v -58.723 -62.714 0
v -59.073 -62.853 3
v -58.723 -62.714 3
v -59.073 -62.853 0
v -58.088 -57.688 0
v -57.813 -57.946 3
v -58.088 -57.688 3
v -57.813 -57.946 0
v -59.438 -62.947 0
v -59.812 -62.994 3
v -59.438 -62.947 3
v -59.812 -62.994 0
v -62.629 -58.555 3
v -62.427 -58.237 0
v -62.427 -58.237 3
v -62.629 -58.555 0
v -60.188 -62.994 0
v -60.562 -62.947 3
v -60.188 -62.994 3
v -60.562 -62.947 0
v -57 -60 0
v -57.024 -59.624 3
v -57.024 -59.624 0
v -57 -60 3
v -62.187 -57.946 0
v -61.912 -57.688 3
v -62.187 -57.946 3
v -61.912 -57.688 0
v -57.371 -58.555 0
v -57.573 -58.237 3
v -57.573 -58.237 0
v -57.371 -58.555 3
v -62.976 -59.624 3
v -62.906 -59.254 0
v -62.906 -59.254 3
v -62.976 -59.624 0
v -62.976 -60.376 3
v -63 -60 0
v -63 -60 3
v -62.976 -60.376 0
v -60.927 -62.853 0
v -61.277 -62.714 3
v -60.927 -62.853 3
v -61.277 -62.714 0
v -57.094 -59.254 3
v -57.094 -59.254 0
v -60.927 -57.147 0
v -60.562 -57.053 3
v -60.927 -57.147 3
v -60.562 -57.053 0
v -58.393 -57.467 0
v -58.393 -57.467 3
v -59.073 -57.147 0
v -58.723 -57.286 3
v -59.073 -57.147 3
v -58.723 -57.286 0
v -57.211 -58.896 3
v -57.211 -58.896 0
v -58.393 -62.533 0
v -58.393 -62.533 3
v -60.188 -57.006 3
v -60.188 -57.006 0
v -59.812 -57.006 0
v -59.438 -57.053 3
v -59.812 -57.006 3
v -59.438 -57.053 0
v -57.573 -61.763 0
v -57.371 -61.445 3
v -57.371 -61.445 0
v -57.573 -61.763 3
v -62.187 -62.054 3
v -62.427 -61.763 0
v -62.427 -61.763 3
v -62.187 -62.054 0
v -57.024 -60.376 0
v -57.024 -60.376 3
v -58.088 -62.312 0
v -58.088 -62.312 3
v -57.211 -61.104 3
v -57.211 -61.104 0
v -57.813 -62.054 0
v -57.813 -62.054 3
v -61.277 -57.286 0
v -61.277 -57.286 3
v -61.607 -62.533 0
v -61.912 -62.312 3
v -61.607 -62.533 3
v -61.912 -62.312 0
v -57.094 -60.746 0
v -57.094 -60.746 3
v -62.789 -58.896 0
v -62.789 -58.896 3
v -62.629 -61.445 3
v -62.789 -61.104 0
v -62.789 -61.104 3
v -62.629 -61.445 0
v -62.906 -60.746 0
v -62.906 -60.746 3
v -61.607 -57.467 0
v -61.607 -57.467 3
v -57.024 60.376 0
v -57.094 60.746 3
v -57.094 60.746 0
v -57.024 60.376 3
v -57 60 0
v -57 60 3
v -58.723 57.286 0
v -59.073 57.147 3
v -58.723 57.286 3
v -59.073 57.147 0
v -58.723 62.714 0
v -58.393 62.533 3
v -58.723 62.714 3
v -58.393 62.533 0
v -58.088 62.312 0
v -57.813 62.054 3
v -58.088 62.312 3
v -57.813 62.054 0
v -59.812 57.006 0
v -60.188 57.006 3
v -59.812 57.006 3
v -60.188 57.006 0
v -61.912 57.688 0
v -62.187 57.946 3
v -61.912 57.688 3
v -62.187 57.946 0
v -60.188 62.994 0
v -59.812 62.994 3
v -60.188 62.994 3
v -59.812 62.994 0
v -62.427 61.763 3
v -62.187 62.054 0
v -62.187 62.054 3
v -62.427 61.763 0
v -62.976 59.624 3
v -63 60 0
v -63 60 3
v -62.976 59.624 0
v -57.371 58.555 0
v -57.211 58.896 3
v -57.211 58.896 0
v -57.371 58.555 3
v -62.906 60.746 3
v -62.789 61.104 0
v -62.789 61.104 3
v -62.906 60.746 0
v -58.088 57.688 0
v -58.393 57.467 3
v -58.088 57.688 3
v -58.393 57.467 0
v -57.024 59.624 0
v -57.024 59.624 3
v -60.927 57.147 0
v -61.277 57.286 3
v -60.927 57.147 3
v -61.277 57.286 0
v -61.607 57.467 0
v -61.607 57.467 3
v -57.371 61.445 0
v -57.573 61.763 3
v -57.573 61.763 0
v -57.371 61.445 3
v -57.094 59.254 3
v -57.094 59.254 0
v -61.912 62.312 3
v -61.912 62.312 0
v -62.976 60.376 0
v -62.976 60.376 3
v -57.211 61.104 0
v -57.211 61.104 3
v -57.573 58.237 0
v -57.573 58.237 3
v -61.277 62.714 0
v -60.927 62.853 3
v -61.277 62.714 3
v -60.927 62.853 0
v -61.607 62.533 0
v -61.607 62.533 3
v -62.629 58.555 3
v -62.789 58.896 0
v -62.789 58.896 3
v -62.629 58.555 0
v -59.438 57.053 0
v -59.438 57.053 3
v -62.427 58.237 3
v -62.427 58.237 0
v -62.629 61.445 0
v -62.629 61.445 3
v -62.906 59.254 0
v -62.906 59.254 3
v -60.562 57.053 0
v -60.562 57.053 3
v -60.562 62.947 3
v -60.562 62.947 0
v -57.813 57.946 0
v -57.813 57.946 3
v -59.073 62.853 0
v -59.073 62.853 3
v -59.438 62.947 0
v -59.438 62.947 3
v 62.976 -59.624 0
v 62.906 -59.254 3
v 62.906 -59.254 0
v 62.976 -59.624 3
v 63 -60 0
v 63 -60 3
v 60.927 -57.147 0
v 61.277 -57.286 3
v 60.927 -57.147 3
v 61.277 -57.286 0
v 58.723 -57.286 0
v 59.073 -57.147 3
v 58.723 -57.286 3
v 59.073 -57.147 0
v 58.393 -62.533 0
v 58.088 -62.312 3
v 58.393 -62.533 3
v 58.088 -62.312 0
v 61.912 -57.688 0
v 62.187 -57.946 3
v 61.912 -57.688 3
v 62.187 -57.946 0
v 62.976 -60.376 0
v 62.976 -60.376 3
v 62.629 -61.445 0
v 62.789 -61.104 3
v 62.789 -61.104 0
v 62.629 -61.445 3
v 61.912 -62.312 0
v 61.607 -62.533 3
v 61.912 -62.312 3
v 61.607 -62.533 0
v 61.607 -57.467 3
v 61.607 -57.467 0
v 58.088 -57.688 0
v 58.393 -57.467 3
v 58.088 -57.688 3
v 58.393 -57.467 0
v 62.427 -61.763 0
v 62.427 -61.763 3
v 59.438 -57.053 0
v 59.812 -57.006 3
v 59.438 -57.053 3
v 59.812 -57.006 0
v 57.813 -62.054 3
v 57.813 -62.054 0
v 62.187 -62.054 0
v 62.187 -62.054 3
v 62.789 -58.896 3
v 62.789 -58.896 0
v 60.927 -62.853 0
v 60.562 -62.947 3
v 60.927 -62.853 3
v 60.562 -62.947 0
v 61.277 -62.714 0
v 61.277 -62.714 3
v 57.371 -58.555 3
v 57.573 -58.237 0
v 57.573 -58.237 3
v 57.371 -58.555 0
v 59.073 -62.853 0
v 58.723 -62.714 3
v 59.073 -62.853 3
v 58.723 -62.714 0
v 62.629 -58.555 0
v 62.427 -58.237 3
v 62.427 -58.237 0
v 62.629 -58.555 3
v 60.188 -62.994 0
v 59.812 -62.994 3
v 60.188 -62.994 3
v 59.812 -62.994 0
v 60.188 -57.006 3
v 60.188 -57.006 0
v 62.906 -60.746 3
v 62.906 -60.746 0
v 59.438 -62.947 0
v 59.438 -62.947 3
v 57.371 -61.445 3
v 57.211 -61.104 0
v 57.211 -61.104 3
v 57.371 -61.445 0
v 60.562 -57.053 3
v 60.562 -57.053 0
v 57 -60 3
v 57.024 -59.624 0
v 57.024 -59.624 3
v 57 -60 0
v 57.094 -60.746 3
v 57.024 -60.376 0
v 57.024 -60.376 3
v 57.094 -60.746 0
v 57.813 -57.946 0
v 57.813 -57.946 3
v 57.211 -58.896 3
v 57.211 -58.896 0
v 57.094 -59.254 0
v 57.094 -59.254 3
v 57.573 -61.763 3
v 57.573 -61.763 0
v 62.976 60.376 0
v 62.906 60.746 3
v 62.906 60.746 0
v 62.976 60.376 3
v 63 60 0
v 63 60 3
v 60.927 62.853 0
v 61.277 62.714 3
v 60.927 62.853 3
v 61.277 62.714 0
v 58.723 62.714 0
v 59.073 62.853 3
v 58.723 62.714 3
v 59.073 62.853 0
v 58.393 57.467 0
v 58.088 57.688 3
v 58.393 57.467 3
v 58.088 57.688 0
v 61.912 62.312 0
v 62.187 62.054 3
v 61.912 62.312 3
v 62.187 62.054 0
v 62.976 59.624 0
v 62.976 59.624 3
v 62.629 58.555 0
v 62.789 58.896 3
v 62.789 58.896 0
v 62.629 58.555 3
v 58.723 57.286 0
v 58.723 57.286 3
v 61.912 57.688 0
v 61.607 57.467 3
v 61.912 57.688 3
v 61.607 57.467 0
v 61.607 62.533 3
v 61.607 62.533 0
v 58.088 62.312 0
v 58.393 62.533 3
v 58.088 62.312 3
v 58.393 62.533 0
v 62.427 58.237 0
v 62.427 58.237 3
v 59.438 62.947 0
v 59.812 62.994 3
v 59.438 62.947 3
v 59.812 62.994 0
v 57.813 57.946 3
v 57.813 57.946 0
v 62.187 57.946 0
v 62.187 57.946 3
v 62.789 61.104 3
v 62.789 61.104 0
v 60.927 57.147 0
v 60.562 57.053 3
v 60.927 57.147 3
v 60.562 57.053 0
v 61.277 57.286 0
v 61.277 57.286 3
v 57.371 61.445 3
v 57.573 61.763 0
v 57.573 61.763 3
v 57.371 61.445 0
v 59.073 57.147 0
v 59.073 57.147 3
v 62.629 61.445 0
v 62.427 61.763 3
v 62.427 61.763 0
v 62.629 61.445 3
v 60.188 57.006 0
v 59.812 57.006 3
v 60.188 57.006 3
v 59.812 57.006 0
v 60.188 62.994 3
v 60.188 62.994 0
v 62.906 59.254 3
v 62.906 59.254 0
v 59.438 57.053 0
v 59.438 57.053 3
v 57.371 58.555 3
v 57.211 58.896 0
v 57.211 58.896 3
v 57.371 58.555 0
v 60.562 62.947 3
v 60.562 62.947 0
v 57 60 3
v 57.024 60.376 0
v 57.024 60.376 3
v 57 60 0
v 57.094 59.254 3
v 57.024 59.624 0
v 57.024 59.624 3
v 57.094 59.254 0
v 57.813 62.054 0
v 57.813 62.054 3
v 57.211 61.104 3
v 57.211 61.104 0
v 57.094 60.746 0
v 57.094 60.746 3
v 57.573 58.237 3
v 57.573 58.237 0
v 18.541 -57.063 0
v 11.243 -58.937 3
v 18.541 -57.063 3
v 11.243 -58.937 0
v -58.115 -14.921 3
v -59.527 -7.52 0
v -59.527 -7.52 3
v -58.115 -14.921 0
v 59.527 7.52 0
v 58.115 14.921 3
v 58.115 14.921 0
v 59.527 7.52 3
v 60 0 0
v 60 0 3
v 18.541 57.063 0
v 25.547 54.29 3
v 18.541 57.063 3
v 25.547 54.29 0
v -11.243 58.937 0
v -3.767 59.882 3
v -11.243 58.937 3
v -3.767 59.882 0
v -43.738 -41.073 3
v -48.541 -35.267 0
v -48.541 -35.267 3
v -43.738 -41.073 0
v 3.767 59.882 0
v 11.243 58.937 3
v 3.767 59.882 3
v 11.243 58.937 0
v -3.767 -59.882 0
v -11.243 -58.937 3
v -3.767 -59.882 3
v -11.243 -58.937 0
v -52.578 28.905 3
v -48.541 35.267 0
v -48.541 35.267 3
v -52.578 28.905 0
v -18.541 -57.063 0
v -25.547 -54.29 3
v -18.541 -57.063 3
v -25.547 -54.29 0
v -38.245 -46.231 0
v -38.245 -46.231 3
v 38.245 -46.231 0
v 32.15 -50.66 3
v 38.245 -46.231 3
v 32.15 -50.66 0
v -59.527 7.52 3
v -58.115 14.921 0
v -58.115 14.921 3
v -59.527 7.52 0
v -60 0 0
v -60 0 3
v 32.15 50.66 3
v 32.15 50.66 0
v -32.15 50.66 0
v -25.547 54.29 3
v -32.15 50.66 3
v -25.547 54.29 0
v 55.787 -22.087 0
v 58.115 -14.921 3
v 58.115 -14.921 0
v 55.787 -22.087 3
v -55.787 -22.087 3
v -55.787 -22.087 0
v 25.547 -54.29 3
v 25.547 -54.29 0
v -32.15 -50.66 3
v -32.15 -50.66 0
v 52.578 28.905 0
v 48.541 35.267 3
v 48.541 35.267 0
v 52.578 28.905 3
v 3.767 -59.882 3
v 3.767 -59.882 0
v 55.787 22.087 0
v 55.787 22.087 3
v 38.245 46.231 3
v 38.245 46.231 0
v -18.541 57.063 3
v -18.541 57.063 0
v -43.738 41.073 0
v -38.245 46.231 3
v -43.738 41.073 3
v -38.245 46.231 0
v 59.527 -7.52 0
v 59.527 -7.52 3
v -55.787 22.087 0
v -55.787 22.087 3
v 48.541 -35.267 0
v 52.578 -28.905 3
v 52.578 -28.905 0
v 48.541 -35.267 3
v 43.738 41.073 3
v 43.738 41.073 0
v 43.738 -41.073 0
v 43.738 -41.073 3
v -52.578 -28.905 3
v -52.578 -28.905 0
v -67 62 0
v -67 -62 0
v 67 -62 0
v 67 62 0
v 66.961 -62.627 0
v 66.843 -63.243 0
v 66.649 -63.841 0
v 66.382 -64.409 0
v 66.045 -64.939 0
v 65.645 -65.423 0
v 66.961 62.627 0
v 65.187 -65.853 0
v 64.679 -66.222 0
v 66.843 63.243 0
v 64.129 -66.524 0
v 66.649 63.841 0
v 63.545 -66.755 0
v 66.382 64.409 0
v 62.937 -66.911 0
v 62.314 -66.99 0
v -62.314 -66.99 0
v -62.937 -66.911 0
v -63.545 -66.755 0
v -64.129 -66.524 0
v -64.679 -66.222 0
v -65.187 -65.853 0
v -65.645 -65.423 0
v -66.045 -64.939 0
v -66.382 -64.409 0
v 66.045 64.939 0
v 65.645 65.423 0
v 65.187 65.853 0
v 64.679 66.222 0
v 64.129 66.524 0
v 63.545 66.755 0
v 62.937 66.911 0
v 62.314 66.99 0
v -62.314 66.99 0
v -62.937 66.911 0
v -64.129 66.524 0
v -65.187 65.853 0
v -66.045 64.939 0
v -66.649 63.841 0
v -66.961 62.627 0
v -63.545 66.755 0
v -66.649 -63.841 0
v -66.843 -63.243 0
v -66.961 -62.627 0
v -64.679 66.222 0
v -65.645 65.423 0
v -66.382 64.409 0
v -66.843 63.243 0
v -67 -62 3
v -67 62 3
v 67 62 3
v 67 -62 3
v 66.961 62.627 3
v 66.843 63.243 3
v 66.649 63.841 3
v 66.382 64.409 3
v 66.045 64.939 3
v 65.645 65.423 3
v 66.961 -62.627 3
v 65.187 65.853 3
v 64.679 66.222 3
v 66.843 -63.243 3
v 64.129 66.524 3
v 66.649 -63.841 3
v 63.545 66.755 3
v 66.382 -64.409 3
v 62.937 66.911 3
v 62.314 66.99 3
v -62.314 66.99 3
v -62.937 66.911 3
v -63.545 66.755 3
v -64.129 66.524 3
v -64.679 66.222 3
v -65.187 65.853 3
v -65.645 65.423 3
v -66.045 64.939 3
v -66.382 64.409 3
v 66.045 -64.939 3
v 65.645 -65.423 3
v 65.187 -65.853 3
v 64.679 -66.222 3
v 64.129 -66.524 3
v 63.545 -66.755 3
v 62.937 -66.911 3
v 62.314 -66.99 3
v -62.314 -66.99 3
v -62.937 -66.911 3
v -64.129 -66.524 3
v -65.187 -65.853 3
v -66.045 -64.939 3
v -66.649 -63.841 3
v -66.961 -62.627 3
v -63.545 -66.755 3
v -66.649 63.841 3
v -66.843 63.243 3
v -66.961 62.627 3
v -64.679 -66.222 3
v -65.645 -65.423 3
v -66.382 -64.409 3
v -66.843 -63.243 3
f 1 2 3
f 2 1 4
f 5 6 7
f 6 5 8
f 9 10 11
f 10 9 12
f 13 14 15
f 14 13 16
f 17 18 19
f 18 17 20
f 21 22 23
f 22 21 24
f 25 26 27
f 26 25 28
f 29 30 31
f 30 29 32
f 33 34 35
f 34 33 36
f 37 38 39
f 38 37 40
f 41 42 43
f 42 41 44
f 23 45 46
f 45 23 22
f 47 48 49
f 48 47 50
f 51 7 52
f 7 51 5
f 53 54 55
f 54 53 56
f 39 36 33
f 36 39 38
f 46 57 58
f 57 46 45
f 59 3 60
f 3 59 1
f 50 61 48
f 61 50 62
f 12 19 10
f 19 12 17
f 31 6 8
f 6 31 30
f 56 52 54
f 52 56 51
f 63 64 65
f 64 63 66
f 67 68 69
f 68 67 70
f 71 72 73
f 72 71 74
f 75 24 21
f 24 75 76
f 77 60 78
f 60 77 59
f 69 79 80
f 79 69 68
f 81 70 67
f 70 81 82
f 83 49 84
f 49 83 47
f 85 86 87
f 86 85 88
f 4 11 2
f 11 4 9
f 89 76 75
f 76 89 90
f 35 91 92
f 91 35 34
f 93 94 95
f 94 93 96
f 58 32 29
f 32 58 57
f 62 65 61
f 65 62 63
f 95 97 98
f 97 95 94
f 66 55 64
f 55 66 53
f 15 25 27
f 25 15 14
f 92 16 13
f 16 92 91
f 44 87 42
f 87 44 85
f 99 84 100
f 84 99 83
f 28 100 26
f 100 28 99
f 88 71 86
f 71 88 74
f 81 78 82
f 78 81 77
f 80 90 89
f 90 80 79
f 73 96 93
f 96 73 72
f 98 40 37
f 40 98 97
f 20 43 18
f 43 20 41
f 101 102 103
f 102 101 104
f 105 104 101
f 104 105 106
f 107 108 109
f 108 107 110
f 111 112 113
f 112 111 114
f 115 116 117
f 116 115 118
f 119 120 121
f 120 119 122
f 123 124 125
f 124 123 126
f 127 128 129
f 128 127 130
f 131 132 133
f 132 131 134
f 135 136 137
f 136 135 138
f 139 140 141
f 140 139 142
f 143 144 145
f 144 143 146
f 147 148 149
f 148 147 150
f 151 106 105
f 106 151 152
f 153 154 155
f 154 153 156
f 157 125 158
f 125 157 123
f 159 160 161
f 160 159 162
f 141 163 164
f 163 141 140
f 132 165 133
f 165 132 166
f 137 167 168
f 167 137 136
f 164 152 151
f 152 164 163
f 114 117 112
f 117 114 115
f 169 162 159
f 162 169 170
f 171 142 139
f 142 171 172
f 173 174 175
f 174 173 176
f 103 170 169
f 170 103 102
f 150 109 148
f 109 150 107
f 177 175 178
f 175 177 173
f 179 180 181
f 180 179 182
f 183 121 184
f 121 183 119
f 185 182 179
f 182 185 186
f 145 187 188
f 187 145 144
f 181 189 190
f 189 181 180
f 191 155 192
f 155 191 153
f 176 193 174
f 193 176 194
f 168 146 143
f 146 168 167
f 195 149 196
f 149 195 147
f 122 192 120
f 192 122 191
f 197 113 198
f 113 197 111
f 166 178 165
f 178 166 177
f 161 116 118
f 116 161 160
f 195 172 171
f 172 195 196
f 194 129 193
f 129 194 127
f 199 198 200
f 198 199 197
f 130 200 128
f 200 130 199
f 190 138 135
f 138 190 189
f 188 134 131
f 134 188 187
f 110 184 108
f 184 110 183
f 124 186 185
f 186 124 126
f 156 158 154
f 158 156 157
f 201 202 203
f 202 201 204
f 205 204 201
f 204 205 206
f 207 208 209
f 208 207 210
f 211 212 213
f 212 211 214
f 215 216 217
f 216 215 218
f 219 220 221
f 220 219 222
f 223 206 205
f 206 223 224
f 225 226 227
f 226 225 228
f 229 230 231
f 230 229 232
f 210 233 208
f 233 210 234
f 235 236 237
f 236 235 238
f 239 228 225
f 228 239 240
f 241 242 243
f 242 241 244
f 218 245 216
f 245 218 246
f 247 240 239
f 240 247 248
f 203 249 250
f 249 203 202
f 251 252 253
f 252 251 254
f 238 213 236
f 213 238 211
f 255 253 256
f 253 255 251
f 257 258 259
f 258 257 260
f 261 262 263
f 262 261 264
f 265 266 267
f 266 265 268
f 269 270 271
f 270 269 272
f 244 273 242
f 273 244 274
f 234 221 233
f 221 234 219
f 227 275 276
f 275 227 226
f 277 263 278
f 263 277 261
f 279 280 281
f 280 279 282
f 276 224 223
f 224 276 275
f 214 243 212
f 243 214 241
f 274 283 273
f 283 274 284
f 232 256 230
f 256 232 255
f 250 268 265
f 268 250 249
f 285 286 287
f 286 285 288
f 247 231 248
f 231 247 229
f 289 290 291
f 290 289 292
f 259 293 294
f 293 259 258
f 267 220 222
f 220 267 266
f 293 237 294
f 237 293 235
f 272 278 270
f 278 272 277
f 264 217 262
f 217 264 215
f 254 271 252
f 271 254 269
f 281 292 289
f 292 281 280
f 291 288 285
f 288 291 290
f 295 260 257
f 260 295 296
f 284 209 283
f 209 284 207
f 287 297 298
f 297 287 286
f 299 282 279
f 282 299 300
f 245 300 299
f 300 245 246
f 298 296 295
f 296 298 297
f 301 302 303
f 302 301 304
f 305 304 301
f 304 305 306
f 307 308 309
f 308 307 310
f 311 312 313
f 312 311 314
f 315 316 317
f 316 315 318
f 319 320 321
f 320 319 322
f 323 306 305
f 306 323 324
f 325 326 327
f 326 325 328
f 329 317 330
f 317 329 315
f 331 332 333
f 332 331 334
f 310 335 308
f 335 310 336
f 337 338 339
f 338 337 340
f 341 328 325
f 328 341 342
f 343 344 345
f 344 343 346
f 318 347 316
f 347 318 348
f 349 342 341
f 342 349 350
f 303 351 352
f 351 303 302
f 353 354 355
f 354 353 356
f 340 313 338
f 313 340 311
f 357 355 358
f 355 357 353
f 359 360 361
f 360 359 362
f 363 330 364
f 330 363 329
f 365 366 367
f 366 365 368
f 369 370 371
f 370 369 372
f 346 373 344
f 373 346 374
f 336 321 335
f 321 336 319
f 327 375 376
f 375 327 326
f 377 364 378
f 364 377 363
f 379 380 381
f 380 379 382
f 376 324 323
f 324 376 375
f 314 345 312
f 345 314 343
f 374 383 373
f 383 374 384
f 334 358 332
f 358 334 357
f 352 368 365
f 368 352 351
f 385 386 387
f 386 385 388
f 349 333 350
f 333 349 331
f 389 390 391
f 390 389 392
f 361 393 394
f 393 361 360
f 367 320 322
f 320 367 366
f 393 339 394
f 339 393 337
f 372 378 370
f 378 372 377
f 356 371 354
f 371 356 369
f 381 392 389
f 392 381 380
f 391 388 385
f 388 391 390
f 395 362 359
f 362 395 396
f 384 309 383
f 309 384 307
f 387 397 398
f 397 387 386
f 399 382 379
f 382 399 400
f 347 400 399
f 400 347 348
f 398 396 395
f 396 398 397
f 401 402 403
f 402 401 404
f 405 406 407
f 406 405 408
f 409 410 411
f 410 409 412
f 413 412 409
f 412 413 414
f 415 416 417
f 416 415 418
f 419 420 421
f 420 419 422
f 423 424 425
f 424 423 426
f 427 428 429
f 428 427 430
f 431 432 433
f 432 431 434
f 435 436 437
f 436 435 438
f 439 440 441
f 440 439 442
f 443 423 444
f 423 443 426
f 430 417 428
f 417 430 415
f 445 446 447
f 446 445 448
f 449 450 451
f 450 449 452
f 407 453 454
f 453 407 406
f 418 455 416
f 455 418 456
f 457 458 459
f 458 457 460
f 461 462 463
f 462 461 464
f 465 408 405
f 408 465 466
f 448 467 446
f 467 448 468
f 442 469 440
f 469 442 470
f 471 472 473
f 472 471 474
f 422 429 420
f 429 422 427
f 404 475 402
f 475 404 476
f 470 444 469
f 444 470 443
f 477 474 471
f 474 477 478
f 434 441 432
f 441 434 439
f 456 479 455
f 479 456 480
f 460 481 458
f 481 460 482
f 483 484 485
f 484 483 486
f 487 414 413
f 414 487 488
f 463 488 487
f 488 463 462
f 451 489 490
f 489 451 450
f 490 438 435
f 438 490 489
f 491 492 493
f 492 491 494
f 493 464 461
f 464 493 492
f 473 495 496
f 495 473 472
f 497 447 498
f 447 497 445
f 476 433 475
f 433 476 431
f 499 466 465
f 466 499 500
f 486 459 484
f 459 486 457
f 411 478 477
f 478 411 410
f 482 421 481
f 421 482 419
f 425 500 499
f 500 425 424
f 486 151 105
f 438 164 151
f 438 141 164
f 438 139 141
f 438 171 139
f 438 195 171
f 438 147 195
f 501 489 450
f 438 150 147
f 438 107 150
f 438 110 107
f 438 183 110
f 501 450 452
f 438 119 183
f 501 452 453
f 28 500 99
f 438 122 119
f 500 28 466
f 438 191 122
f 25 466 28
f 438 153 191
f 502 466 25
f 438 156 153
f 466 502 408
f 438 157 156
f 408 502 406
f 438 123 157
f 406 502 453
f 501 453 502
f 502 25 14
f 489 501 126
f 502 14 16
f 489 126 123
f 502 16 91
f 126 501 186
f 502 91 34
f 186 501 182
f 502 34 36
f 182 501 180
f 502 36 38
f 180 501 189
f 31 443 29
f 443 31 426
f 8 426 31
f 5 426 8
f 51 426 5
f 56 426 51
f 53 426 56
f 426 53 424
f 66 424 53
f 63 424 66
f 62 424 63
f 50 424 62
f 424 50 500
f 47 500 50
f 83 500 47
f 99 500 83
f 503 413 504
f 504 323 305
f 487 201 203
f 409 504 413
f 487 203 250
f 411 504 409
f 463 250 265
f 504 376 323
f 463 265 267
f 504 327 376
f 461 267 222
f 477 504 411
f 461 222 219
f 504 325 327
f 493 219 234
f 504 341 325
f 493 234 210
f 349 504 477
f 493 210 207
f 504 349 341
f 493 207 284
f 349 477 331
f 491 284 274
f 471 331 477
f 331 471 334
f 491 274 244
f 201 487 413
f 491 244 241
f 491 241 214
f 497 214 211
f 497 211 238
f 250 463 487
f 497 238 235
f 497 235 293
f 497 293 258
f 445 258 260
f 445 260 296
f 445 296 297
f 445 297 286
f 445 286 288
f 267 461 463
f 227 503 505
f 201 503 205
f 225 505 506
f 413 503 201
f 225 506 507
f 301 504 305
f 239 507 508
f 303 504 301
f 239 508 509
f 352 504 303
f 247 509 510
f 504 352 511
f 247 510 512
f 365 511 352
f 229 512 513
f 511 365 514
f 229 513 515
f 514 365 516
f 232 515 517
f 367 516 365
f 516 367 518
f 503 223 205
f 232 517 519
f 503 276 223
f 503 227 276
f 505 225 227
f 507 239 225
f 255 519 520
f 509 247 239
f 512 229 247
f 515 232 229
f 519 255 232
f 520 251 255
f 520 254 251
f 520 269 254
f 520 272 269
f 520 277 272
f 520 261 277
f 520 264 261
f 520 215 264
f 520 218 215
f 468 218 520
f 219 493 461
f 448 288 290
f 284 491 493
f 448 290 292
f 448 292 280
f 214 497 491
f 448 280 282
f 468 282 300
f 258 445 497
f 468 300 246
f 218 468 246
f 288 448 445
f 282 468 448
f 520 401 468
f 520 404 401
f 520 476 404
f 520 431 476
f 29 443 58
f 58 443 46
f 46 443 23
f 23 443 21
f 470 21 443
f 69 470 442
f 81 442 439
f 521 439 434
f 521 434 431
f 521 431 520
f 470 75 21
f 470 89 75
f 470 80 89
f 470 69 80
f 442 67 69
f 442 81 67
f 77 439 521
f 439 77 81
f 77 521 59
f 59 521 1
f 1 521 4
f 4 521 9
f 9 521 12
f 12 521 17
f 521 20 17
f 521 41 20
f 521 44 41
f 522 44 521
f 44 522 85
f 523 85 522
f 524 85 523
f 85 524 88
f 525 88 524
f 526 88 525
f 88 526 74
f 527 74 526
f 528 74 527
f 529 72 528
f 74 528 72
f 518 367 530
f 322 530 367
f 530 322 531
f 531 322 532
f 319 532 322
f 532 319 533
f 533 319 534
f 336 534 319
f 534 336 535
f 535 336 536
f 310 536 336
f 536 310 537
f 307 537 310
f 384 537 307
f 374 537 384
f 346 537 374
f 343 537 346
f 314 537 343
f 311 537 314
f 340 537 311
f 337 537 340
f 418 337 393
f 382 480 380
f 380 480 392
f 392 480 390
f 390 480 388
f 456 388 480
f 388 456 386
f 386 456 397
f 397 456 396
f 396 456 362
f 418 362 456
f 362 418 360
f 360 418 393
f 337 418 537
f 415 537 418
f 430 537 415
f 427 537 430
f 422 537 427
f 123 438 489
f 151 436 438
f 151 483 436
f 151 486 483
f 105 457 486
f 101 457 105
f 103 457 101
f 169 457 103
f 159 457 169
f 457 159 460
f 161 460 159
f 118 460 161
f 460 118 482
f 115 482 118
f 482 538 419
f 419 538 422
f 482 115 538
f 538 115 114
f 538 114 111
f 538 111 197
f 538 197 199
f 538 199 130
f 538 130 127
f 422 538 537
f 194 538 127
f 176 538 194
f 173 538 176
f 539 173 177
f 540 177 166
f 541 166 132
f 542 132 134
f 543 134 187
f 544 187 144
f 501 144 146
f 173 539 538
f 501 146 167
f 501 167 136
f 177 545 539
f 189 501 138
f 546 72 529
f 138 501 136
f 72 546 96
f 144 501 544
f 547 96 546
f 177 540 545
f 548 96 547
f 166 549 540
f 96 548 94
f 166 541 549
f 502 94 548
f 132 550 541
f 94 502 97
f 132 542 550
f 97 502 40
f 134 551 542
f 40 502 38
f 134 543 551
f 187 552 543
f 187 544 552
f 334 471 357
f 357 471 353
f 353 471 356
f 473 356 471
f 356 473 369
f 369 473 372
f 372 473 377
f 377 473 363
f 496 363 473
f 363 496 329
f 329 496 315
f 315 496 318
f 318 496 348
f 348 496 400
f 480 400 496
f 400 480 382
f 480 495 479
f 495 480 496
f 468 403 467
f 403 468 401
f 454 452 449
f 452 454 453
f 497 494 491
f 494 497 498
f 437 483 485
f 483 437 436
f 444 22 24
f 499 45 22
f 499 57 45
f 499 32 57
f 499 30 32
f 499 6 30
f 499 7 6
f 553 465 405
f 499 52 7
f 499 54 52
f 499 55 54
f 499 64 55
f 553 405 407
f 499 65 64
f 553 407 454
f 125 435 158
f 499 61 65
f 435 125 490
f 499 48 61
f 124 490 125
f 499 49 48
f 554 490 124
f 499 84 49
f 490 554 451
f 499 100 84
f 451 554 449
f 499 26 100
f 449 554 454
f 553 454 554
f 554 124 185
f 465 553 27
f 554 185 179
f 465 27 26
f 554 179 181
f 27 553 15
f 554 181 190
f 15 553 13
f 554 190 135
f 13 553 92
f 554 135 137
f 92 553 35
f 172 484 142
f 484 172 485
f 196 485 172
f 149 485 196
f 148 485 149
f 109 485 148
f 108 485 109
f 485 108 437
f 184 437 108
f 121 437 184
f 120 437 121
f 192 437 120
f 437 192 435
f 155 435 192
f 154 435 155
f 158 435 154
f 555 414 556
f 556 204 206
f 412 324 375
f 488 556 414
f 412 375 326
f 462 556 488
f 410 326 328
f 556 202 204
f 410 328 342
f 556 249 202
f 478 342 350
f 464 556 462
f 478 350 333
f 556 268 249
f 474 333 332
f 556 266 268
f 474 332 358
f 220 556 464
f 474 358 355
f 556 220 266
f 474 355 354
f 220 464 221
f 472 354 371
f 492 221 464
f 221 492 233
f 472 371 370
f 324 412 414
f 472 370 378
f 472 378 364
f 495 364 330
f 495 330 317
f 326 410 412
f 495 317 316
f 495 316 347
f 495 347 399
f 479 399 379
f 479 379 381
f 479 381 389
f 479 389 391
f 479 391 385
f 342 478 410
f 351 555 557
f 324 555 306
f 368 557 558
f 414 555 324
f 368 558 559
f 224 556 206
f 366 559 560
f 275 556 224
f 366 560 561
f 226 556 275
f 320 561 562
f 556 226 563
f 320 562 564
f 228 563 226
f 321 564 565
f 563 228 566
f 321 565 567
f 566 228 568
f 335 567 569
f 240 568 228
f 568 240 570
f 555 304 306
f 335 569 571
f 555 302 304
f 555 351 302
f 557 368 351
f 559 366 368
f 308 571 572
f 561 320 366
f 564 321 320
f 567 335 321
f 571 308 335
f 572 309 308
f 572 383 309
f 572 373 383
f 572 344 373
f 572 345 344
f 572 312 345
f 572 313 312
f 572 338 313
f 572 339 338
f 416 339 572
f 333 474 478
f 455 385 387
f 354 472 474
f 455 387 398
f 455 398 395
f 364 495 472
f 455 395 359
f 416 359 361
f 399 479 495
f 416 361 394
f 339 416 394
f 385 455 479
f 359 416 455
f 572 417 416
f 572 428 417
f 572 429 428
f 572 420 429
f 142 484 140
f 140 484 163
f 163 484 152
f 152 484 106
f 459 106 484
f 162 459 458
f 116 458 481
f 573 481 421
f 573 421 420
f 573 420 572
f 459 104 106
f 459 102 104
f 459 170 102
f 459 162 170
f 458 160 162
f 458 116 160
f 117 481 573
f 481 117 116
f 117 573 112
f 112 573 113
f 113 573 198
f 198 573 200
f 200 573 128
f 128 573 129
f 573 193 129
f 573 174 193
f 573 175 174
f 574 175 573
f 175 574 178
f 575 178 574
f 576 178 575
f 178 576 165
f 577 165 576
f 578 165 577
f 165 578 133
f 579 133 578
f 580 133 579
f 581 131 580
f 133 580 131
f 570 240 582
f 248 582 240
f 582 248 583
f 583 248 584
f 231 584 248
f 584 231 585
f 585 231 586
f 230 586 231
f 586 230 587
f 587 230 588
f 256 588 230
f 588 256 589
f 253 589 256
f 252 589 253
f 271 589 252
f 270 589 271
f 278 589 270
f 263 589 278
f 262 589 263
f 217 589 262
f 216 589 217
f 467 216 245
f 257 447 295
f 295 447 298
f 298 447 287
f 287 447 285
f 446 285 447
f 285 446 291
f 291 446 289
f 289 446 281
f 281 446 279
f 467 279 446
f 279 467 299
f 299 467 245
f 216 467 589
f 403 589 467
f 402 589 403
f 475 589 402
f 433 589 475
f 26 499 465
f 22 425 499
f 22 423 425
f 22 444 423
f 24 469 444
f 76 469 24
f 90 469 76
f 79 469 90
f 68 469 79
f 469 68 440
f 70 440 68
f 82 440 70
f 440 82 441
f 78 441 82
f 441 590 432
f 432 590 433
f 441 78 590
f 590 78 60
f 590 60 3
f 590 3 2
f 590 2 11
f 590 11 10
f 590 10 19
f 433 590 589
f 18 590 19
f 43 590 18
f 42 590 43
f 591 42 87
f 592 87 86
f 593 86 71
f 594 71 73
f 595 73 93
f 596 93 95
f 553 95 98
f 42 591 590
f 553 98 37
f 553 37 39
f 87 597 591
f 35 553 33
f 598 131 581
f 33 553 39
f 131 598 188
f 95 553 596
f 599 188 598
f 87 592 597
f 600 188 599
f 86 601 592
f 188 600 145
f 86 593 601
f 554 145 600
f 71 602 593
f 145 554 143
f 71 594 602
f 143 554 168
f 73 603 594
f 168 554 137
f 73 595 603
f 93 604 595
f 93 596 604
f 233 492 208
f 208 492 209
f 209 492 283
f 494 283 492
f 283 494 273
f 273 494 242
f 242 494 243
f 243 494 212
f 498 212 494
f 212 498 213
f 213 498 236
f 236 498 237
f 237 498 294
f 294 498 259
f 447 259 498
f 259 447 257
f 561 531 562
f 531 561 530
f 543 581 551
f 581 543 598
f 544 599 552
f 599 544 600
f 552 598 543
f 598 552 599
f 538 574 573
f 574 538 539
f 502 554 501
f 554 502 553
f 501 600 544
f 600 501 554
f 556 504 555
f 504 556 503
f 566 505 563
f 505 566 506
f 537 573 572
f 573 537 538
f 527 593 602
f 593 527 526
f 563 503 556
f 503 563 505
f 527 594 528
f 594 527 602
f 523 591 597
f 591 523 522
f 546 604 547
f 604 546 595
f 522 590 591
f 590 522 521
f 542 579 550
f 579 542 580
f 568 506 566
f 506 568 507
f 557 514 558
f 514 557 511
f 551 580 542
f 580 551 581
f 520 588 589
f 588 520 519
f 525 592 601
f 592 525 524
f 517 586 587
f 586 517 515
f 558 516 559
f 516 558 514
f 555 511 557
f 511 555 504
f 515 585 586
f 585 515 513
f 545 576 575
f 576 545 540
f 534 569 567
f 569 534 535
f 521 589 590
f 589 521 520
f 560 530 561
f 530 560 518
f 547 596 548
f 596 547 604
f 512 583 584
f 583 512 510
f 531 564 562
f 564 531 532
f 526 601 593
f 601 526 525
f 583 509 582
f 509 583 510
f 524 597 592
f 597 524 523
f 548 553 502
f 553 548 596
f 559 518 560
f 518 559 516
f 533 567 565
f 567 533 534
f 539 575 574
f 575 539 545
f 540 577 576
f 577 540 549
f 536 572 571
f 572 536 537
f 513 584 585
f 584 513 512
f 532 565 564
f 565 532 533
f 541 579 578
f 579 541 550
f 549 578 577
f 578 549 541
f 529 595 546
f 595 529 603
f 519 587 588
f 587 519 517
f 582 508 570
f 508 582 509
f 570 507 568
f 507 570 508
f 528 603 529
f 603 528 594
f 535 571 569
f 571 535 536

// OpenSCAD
$fn = 50;


difference() {
	union() {
		hull() {
			translate(v = [-62.0000000000, 62.0000000000, 0]) {
				cylinder(h = 3, r = 5);
			}
			translate(v = [62.0000000000, 62.0000000000, 0]) {
				cylinder(h = 3, r = 5);
			}
			translate(v = [-62.0000000000, -62.0000000000, 0]) {
				cylinder(h = 3, r = 5);
			}
			translate(v = [62.0000000000, -62.0000000000, 0]) {
				cylinder(h = 3, r = 5);
			}
		}
	}
	union() {
		#translate(v = [-60.0000000000, -60.0000000000, -100.0000000000]) {
			cylinder(h = 200, r = 3.0000000000);
		}
		#translate(v = [-60.0000000000, 60.0000000000, -100.0000000000]) {
			cylinder(h = 200, r = 3.0000000000);
		}
		#translate(v = [60.0000000000, -60.0000000000, -100.0000000000]) {
			cylinder(h = 200, r = 3.0000000000);
		}
		#translate(v = [60.0000000000, 60.0000000000, -100.0000000000]) {
			cylinder(h = 200, r = 3.0000000000);
		}
		#cylinder(h = 3, r = 60.0000000000);
	}
}
